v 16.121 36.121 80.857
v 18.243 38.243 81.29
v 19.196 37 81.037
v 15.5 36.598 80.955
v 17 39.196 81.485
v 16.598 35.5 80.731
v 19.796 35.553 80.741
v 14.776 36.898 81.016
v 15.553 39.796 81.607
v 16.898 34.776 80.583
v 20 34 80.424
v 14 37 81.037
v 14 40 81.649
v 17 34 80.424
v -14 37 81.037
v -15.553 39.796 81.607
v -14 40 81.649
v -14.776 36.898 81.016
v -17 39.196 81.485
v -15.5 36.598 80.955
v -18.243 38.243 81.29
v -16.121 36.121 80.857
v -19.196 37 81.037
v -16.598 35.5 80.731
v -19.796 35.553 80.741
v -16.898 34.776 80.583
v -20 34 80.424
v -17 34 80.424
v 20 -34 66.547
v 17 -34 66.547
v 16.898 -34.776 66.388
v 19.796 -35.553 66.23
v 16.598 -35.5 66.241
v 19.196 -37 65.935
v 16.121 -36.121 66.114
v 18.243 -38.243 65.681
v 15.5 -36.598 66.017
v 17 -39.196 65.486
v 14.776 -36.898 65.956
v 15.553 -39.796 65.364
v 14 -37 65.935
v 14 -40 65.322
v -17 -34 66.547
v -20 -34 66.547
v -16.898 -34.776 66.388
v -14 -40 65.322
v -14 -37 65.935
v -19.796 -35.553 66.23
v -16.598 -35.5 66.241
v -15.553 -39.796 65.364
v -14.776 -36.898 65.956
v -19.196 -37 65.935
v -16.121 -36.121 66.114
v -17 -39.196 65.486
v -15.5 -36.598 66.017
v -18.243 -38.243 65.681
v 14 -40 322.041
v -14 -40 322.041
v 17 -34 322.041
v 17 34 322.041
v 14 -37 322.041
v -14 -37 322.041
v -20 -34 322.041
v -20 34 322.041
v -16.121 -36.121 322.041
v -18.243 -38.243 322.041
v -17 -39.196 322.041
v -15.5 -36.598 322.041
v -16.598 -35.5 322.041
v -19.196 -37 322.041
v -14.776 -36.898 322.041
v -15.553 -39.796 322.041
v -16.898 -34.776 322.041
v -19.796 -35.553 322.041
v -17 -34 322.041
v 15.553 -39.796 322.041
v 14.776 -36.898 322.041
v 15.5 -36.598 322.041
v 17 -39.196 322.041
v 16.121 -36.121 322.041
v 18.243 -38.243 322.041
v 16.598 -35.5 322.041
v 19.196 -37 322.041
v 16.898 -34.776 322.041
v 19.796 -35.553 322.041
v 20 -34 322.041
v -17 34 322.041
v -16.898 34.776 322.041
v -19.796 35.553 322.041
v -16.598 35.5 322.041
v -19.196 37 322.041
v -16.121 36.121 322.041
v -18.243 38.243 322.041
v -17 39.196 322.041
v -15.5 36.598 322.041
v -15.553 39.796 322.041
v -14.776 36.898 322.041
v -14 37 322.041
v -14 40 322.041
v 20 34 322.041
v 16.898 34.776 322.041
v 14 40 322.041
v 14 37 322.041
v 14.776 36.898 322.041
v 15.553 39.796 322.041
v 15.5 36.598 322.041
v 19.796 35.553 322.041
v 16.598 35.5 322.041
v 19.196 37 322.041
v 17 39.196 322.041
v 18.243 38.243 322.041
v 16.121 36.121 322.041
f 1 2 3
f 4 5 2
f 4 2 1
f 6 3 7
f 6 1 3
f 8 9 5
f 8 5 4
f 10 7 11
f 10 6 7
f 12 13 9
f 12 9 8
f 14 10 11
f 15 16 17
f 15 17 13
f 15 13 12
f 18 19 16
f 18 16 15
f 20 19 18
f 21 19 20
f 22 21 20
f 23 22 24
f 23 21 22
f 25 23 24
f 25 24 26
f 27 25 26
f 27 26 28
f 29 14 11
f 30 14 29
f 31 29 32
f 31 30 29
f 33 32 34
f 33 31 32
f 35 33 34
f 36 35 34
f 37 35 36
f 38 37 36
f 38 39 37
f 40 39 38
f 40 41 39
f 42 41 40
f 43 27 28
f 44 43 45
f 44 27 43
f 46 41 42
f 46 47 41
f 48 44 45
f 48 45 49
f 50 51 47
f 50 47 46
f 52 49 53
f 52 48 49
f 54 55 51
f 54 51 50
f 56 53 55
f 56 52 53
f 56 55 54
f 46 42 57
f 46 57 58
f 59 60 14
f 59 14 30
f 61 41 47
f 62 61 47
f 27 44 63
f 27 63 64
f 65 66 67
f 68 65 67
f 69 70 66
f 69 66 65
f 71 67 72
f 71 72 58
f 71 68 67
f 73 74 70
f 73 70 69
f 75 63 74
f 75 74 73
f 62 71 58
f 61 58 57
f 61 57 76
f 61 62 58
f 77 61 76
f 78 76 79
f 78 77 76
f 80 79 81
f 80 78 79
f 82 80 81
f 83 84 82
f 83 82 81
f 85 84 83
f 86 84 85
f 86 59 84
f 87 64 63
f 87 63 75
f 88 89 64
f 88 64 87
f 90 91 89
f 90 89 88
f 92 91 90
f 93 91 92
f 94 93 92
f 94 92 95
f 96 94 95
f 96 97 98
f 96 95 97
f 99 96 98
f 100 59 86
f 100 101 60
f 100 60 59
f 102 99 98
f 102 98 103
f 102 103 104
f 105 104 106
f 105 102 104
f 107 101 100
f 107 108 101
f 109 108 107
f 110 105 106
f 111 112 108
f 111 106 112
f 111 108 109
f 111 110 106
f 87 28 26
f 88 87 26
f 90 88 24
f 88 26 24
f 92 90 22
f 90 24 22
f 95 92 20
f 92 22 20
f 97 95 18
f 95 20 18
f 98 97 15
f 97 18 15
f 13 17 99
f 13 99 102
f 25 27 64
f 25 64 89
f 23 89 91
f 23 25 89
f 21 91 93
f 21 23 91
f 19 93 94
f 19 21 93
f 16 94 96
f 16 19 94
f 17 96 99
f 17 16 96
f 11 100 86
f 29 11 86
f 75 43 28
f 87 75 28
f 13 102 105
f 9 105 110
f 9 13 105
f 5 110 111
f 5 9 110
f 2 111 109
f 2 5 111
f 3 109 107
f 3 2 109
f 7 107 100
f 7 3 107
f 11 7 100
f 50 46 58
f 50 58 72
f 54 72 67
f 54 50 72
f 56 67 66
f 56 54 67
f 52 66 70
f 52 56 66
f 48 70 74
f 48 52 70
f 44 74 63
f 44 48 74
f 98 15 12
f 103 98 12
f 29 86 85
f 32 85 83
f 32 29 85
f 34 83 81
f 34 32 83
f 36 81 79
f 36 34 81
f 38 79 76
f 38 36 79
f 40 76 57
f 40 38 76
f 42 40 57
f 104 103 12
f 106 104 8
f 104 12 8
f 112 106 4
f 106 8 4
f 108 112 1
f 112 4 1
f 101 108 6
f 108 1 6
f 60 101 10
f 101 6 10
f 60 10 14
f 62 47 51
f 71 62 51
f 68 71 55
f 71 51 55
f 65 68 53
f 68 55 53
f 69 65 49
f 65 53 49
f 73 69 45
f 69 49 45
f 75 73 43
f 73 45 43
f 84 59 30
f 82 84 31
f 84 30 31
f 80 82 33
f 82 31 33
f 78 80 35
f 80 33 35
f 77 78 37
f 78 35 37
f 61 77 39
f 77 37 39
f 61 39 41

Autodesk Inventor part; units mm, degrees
ref_plane "Start Plane" through (0, 0, 65.3224) normal (0, 0, 1) x (1, 0, 0)
ref_plane "End Plane" through (0, 0, 322.0408) normal (0, 0, 1) x (1, 0, 0)
sketch "Sketch" plane through (0, 0, 0) normal (0, 0, 1) x (1, 0, 0)
  line L0 (-20, -34) -> (-20, 34)
  line L1 (-14, 40) -> (14, 40)
  line L2 (20, 34) -> (20, -34)
  line L3 (14, -40) -> (-14, -40)
  arc A0 (-20, -34) -> (-14, -40) centre (-14, -34) ccw
  arc A1 (20, 34) -> (14, 40) centre (14, 34) ccw
  arc A2 (-14, 40) -> (-20, 34) centre (-14, 34) ccw
  arc A3 (14, -40) -> (20, -34) centre (14, -34) ccw
  arc A4 (-14, 37) -> (-17, 34) centre (-14, 34) ccw
  line L4 (-14, 37) -> (14, 37)
  arc A5 (17, 34) -> (14, 37) centre (14, 34) ccw
  line L5 (17, 34) -> (17, -34)
  arc A6 (14, -37) -> (17, -34) centre (14, -34) ccw
  line L6 (14, -37) -> (-14, -37)
  arc A7 (-17, -34) -> (-14, -37) centre (-14, -34) ccw
  line L7 (-17, -34) -> (-17, 34)
  line L8 (0, 57.7397) -> (0, -57.7397) construction
  line L9 (-29.7397, 0) -> (29.7397, 0) construction
  dimension "d7" = 6
  dimension "d9" = 40
  dimension "d11" = 80
  dimension "d12" = 3
  dimension "d15" = 20
  dimension "d16" = 40
extrude "Body" add sketch "Sketch" along normal up to surface (256.7184 mm away) from surface at 65.3224
sketch "Sketch3" plane through (0, 0, 0) normal (0, 0, 1) x (1, 0, 0)
  line L0 (0, 0) -> (10, 0)
ref_plane "Work Plane3" through (0, 0, 0) normal (0, -1, 0) x (1, 0, 0)
ref_plane "Work Plane4" through (-14, 524.0032, 180.4251) normal (0, 0.19996, -0.9798041) x (1, 0, 0)
split "Split1" plane through (-14, 524.0032, 180.4251) removes the side toward (0, 0.19996, -0.9798041)
sketch "Sketch4" plane through (0, 0, 0) normal (0, -1, 0) x (1, 0, 0)
  line L0 (-2, 65.3224) -> (12, 65.3224) projected
  line L1 (-2, 322.0408) -> (12, 322.0408) projected
  dimension "d18" = 256.7184
equation "\"d7\" = G_IR"
equation "\"d9\" = G_W"
equation "\"d11\" = G_H"
equation "\"d12\" = G_T"
equation "\"d15\" = 0.5 * d9"
equation "\"d16\" = 0.5 * d11"
equation "\"d3\" = G_L"
equation "\"G_W\" = 40"
equation "\"G_H\" = 80"
equation "\"G_T\" = 3"
equation "\"G_IR\" = 6"
equation "\"G_L\" = d18"
equation "\"G_OFFSET_START\" = -65.32245"
equation "\"d13\" = -G_OFFSET_START"
equation "\"d14\" = G_OFFSET_END + B_L"
equation "\"B_L\" = 402.04082"
equation "\"G_OFFSET_END\" = -80"
properties part number "ISO 10799-2 - 80x40x3 - 256,72" material "Steel, Mild"
